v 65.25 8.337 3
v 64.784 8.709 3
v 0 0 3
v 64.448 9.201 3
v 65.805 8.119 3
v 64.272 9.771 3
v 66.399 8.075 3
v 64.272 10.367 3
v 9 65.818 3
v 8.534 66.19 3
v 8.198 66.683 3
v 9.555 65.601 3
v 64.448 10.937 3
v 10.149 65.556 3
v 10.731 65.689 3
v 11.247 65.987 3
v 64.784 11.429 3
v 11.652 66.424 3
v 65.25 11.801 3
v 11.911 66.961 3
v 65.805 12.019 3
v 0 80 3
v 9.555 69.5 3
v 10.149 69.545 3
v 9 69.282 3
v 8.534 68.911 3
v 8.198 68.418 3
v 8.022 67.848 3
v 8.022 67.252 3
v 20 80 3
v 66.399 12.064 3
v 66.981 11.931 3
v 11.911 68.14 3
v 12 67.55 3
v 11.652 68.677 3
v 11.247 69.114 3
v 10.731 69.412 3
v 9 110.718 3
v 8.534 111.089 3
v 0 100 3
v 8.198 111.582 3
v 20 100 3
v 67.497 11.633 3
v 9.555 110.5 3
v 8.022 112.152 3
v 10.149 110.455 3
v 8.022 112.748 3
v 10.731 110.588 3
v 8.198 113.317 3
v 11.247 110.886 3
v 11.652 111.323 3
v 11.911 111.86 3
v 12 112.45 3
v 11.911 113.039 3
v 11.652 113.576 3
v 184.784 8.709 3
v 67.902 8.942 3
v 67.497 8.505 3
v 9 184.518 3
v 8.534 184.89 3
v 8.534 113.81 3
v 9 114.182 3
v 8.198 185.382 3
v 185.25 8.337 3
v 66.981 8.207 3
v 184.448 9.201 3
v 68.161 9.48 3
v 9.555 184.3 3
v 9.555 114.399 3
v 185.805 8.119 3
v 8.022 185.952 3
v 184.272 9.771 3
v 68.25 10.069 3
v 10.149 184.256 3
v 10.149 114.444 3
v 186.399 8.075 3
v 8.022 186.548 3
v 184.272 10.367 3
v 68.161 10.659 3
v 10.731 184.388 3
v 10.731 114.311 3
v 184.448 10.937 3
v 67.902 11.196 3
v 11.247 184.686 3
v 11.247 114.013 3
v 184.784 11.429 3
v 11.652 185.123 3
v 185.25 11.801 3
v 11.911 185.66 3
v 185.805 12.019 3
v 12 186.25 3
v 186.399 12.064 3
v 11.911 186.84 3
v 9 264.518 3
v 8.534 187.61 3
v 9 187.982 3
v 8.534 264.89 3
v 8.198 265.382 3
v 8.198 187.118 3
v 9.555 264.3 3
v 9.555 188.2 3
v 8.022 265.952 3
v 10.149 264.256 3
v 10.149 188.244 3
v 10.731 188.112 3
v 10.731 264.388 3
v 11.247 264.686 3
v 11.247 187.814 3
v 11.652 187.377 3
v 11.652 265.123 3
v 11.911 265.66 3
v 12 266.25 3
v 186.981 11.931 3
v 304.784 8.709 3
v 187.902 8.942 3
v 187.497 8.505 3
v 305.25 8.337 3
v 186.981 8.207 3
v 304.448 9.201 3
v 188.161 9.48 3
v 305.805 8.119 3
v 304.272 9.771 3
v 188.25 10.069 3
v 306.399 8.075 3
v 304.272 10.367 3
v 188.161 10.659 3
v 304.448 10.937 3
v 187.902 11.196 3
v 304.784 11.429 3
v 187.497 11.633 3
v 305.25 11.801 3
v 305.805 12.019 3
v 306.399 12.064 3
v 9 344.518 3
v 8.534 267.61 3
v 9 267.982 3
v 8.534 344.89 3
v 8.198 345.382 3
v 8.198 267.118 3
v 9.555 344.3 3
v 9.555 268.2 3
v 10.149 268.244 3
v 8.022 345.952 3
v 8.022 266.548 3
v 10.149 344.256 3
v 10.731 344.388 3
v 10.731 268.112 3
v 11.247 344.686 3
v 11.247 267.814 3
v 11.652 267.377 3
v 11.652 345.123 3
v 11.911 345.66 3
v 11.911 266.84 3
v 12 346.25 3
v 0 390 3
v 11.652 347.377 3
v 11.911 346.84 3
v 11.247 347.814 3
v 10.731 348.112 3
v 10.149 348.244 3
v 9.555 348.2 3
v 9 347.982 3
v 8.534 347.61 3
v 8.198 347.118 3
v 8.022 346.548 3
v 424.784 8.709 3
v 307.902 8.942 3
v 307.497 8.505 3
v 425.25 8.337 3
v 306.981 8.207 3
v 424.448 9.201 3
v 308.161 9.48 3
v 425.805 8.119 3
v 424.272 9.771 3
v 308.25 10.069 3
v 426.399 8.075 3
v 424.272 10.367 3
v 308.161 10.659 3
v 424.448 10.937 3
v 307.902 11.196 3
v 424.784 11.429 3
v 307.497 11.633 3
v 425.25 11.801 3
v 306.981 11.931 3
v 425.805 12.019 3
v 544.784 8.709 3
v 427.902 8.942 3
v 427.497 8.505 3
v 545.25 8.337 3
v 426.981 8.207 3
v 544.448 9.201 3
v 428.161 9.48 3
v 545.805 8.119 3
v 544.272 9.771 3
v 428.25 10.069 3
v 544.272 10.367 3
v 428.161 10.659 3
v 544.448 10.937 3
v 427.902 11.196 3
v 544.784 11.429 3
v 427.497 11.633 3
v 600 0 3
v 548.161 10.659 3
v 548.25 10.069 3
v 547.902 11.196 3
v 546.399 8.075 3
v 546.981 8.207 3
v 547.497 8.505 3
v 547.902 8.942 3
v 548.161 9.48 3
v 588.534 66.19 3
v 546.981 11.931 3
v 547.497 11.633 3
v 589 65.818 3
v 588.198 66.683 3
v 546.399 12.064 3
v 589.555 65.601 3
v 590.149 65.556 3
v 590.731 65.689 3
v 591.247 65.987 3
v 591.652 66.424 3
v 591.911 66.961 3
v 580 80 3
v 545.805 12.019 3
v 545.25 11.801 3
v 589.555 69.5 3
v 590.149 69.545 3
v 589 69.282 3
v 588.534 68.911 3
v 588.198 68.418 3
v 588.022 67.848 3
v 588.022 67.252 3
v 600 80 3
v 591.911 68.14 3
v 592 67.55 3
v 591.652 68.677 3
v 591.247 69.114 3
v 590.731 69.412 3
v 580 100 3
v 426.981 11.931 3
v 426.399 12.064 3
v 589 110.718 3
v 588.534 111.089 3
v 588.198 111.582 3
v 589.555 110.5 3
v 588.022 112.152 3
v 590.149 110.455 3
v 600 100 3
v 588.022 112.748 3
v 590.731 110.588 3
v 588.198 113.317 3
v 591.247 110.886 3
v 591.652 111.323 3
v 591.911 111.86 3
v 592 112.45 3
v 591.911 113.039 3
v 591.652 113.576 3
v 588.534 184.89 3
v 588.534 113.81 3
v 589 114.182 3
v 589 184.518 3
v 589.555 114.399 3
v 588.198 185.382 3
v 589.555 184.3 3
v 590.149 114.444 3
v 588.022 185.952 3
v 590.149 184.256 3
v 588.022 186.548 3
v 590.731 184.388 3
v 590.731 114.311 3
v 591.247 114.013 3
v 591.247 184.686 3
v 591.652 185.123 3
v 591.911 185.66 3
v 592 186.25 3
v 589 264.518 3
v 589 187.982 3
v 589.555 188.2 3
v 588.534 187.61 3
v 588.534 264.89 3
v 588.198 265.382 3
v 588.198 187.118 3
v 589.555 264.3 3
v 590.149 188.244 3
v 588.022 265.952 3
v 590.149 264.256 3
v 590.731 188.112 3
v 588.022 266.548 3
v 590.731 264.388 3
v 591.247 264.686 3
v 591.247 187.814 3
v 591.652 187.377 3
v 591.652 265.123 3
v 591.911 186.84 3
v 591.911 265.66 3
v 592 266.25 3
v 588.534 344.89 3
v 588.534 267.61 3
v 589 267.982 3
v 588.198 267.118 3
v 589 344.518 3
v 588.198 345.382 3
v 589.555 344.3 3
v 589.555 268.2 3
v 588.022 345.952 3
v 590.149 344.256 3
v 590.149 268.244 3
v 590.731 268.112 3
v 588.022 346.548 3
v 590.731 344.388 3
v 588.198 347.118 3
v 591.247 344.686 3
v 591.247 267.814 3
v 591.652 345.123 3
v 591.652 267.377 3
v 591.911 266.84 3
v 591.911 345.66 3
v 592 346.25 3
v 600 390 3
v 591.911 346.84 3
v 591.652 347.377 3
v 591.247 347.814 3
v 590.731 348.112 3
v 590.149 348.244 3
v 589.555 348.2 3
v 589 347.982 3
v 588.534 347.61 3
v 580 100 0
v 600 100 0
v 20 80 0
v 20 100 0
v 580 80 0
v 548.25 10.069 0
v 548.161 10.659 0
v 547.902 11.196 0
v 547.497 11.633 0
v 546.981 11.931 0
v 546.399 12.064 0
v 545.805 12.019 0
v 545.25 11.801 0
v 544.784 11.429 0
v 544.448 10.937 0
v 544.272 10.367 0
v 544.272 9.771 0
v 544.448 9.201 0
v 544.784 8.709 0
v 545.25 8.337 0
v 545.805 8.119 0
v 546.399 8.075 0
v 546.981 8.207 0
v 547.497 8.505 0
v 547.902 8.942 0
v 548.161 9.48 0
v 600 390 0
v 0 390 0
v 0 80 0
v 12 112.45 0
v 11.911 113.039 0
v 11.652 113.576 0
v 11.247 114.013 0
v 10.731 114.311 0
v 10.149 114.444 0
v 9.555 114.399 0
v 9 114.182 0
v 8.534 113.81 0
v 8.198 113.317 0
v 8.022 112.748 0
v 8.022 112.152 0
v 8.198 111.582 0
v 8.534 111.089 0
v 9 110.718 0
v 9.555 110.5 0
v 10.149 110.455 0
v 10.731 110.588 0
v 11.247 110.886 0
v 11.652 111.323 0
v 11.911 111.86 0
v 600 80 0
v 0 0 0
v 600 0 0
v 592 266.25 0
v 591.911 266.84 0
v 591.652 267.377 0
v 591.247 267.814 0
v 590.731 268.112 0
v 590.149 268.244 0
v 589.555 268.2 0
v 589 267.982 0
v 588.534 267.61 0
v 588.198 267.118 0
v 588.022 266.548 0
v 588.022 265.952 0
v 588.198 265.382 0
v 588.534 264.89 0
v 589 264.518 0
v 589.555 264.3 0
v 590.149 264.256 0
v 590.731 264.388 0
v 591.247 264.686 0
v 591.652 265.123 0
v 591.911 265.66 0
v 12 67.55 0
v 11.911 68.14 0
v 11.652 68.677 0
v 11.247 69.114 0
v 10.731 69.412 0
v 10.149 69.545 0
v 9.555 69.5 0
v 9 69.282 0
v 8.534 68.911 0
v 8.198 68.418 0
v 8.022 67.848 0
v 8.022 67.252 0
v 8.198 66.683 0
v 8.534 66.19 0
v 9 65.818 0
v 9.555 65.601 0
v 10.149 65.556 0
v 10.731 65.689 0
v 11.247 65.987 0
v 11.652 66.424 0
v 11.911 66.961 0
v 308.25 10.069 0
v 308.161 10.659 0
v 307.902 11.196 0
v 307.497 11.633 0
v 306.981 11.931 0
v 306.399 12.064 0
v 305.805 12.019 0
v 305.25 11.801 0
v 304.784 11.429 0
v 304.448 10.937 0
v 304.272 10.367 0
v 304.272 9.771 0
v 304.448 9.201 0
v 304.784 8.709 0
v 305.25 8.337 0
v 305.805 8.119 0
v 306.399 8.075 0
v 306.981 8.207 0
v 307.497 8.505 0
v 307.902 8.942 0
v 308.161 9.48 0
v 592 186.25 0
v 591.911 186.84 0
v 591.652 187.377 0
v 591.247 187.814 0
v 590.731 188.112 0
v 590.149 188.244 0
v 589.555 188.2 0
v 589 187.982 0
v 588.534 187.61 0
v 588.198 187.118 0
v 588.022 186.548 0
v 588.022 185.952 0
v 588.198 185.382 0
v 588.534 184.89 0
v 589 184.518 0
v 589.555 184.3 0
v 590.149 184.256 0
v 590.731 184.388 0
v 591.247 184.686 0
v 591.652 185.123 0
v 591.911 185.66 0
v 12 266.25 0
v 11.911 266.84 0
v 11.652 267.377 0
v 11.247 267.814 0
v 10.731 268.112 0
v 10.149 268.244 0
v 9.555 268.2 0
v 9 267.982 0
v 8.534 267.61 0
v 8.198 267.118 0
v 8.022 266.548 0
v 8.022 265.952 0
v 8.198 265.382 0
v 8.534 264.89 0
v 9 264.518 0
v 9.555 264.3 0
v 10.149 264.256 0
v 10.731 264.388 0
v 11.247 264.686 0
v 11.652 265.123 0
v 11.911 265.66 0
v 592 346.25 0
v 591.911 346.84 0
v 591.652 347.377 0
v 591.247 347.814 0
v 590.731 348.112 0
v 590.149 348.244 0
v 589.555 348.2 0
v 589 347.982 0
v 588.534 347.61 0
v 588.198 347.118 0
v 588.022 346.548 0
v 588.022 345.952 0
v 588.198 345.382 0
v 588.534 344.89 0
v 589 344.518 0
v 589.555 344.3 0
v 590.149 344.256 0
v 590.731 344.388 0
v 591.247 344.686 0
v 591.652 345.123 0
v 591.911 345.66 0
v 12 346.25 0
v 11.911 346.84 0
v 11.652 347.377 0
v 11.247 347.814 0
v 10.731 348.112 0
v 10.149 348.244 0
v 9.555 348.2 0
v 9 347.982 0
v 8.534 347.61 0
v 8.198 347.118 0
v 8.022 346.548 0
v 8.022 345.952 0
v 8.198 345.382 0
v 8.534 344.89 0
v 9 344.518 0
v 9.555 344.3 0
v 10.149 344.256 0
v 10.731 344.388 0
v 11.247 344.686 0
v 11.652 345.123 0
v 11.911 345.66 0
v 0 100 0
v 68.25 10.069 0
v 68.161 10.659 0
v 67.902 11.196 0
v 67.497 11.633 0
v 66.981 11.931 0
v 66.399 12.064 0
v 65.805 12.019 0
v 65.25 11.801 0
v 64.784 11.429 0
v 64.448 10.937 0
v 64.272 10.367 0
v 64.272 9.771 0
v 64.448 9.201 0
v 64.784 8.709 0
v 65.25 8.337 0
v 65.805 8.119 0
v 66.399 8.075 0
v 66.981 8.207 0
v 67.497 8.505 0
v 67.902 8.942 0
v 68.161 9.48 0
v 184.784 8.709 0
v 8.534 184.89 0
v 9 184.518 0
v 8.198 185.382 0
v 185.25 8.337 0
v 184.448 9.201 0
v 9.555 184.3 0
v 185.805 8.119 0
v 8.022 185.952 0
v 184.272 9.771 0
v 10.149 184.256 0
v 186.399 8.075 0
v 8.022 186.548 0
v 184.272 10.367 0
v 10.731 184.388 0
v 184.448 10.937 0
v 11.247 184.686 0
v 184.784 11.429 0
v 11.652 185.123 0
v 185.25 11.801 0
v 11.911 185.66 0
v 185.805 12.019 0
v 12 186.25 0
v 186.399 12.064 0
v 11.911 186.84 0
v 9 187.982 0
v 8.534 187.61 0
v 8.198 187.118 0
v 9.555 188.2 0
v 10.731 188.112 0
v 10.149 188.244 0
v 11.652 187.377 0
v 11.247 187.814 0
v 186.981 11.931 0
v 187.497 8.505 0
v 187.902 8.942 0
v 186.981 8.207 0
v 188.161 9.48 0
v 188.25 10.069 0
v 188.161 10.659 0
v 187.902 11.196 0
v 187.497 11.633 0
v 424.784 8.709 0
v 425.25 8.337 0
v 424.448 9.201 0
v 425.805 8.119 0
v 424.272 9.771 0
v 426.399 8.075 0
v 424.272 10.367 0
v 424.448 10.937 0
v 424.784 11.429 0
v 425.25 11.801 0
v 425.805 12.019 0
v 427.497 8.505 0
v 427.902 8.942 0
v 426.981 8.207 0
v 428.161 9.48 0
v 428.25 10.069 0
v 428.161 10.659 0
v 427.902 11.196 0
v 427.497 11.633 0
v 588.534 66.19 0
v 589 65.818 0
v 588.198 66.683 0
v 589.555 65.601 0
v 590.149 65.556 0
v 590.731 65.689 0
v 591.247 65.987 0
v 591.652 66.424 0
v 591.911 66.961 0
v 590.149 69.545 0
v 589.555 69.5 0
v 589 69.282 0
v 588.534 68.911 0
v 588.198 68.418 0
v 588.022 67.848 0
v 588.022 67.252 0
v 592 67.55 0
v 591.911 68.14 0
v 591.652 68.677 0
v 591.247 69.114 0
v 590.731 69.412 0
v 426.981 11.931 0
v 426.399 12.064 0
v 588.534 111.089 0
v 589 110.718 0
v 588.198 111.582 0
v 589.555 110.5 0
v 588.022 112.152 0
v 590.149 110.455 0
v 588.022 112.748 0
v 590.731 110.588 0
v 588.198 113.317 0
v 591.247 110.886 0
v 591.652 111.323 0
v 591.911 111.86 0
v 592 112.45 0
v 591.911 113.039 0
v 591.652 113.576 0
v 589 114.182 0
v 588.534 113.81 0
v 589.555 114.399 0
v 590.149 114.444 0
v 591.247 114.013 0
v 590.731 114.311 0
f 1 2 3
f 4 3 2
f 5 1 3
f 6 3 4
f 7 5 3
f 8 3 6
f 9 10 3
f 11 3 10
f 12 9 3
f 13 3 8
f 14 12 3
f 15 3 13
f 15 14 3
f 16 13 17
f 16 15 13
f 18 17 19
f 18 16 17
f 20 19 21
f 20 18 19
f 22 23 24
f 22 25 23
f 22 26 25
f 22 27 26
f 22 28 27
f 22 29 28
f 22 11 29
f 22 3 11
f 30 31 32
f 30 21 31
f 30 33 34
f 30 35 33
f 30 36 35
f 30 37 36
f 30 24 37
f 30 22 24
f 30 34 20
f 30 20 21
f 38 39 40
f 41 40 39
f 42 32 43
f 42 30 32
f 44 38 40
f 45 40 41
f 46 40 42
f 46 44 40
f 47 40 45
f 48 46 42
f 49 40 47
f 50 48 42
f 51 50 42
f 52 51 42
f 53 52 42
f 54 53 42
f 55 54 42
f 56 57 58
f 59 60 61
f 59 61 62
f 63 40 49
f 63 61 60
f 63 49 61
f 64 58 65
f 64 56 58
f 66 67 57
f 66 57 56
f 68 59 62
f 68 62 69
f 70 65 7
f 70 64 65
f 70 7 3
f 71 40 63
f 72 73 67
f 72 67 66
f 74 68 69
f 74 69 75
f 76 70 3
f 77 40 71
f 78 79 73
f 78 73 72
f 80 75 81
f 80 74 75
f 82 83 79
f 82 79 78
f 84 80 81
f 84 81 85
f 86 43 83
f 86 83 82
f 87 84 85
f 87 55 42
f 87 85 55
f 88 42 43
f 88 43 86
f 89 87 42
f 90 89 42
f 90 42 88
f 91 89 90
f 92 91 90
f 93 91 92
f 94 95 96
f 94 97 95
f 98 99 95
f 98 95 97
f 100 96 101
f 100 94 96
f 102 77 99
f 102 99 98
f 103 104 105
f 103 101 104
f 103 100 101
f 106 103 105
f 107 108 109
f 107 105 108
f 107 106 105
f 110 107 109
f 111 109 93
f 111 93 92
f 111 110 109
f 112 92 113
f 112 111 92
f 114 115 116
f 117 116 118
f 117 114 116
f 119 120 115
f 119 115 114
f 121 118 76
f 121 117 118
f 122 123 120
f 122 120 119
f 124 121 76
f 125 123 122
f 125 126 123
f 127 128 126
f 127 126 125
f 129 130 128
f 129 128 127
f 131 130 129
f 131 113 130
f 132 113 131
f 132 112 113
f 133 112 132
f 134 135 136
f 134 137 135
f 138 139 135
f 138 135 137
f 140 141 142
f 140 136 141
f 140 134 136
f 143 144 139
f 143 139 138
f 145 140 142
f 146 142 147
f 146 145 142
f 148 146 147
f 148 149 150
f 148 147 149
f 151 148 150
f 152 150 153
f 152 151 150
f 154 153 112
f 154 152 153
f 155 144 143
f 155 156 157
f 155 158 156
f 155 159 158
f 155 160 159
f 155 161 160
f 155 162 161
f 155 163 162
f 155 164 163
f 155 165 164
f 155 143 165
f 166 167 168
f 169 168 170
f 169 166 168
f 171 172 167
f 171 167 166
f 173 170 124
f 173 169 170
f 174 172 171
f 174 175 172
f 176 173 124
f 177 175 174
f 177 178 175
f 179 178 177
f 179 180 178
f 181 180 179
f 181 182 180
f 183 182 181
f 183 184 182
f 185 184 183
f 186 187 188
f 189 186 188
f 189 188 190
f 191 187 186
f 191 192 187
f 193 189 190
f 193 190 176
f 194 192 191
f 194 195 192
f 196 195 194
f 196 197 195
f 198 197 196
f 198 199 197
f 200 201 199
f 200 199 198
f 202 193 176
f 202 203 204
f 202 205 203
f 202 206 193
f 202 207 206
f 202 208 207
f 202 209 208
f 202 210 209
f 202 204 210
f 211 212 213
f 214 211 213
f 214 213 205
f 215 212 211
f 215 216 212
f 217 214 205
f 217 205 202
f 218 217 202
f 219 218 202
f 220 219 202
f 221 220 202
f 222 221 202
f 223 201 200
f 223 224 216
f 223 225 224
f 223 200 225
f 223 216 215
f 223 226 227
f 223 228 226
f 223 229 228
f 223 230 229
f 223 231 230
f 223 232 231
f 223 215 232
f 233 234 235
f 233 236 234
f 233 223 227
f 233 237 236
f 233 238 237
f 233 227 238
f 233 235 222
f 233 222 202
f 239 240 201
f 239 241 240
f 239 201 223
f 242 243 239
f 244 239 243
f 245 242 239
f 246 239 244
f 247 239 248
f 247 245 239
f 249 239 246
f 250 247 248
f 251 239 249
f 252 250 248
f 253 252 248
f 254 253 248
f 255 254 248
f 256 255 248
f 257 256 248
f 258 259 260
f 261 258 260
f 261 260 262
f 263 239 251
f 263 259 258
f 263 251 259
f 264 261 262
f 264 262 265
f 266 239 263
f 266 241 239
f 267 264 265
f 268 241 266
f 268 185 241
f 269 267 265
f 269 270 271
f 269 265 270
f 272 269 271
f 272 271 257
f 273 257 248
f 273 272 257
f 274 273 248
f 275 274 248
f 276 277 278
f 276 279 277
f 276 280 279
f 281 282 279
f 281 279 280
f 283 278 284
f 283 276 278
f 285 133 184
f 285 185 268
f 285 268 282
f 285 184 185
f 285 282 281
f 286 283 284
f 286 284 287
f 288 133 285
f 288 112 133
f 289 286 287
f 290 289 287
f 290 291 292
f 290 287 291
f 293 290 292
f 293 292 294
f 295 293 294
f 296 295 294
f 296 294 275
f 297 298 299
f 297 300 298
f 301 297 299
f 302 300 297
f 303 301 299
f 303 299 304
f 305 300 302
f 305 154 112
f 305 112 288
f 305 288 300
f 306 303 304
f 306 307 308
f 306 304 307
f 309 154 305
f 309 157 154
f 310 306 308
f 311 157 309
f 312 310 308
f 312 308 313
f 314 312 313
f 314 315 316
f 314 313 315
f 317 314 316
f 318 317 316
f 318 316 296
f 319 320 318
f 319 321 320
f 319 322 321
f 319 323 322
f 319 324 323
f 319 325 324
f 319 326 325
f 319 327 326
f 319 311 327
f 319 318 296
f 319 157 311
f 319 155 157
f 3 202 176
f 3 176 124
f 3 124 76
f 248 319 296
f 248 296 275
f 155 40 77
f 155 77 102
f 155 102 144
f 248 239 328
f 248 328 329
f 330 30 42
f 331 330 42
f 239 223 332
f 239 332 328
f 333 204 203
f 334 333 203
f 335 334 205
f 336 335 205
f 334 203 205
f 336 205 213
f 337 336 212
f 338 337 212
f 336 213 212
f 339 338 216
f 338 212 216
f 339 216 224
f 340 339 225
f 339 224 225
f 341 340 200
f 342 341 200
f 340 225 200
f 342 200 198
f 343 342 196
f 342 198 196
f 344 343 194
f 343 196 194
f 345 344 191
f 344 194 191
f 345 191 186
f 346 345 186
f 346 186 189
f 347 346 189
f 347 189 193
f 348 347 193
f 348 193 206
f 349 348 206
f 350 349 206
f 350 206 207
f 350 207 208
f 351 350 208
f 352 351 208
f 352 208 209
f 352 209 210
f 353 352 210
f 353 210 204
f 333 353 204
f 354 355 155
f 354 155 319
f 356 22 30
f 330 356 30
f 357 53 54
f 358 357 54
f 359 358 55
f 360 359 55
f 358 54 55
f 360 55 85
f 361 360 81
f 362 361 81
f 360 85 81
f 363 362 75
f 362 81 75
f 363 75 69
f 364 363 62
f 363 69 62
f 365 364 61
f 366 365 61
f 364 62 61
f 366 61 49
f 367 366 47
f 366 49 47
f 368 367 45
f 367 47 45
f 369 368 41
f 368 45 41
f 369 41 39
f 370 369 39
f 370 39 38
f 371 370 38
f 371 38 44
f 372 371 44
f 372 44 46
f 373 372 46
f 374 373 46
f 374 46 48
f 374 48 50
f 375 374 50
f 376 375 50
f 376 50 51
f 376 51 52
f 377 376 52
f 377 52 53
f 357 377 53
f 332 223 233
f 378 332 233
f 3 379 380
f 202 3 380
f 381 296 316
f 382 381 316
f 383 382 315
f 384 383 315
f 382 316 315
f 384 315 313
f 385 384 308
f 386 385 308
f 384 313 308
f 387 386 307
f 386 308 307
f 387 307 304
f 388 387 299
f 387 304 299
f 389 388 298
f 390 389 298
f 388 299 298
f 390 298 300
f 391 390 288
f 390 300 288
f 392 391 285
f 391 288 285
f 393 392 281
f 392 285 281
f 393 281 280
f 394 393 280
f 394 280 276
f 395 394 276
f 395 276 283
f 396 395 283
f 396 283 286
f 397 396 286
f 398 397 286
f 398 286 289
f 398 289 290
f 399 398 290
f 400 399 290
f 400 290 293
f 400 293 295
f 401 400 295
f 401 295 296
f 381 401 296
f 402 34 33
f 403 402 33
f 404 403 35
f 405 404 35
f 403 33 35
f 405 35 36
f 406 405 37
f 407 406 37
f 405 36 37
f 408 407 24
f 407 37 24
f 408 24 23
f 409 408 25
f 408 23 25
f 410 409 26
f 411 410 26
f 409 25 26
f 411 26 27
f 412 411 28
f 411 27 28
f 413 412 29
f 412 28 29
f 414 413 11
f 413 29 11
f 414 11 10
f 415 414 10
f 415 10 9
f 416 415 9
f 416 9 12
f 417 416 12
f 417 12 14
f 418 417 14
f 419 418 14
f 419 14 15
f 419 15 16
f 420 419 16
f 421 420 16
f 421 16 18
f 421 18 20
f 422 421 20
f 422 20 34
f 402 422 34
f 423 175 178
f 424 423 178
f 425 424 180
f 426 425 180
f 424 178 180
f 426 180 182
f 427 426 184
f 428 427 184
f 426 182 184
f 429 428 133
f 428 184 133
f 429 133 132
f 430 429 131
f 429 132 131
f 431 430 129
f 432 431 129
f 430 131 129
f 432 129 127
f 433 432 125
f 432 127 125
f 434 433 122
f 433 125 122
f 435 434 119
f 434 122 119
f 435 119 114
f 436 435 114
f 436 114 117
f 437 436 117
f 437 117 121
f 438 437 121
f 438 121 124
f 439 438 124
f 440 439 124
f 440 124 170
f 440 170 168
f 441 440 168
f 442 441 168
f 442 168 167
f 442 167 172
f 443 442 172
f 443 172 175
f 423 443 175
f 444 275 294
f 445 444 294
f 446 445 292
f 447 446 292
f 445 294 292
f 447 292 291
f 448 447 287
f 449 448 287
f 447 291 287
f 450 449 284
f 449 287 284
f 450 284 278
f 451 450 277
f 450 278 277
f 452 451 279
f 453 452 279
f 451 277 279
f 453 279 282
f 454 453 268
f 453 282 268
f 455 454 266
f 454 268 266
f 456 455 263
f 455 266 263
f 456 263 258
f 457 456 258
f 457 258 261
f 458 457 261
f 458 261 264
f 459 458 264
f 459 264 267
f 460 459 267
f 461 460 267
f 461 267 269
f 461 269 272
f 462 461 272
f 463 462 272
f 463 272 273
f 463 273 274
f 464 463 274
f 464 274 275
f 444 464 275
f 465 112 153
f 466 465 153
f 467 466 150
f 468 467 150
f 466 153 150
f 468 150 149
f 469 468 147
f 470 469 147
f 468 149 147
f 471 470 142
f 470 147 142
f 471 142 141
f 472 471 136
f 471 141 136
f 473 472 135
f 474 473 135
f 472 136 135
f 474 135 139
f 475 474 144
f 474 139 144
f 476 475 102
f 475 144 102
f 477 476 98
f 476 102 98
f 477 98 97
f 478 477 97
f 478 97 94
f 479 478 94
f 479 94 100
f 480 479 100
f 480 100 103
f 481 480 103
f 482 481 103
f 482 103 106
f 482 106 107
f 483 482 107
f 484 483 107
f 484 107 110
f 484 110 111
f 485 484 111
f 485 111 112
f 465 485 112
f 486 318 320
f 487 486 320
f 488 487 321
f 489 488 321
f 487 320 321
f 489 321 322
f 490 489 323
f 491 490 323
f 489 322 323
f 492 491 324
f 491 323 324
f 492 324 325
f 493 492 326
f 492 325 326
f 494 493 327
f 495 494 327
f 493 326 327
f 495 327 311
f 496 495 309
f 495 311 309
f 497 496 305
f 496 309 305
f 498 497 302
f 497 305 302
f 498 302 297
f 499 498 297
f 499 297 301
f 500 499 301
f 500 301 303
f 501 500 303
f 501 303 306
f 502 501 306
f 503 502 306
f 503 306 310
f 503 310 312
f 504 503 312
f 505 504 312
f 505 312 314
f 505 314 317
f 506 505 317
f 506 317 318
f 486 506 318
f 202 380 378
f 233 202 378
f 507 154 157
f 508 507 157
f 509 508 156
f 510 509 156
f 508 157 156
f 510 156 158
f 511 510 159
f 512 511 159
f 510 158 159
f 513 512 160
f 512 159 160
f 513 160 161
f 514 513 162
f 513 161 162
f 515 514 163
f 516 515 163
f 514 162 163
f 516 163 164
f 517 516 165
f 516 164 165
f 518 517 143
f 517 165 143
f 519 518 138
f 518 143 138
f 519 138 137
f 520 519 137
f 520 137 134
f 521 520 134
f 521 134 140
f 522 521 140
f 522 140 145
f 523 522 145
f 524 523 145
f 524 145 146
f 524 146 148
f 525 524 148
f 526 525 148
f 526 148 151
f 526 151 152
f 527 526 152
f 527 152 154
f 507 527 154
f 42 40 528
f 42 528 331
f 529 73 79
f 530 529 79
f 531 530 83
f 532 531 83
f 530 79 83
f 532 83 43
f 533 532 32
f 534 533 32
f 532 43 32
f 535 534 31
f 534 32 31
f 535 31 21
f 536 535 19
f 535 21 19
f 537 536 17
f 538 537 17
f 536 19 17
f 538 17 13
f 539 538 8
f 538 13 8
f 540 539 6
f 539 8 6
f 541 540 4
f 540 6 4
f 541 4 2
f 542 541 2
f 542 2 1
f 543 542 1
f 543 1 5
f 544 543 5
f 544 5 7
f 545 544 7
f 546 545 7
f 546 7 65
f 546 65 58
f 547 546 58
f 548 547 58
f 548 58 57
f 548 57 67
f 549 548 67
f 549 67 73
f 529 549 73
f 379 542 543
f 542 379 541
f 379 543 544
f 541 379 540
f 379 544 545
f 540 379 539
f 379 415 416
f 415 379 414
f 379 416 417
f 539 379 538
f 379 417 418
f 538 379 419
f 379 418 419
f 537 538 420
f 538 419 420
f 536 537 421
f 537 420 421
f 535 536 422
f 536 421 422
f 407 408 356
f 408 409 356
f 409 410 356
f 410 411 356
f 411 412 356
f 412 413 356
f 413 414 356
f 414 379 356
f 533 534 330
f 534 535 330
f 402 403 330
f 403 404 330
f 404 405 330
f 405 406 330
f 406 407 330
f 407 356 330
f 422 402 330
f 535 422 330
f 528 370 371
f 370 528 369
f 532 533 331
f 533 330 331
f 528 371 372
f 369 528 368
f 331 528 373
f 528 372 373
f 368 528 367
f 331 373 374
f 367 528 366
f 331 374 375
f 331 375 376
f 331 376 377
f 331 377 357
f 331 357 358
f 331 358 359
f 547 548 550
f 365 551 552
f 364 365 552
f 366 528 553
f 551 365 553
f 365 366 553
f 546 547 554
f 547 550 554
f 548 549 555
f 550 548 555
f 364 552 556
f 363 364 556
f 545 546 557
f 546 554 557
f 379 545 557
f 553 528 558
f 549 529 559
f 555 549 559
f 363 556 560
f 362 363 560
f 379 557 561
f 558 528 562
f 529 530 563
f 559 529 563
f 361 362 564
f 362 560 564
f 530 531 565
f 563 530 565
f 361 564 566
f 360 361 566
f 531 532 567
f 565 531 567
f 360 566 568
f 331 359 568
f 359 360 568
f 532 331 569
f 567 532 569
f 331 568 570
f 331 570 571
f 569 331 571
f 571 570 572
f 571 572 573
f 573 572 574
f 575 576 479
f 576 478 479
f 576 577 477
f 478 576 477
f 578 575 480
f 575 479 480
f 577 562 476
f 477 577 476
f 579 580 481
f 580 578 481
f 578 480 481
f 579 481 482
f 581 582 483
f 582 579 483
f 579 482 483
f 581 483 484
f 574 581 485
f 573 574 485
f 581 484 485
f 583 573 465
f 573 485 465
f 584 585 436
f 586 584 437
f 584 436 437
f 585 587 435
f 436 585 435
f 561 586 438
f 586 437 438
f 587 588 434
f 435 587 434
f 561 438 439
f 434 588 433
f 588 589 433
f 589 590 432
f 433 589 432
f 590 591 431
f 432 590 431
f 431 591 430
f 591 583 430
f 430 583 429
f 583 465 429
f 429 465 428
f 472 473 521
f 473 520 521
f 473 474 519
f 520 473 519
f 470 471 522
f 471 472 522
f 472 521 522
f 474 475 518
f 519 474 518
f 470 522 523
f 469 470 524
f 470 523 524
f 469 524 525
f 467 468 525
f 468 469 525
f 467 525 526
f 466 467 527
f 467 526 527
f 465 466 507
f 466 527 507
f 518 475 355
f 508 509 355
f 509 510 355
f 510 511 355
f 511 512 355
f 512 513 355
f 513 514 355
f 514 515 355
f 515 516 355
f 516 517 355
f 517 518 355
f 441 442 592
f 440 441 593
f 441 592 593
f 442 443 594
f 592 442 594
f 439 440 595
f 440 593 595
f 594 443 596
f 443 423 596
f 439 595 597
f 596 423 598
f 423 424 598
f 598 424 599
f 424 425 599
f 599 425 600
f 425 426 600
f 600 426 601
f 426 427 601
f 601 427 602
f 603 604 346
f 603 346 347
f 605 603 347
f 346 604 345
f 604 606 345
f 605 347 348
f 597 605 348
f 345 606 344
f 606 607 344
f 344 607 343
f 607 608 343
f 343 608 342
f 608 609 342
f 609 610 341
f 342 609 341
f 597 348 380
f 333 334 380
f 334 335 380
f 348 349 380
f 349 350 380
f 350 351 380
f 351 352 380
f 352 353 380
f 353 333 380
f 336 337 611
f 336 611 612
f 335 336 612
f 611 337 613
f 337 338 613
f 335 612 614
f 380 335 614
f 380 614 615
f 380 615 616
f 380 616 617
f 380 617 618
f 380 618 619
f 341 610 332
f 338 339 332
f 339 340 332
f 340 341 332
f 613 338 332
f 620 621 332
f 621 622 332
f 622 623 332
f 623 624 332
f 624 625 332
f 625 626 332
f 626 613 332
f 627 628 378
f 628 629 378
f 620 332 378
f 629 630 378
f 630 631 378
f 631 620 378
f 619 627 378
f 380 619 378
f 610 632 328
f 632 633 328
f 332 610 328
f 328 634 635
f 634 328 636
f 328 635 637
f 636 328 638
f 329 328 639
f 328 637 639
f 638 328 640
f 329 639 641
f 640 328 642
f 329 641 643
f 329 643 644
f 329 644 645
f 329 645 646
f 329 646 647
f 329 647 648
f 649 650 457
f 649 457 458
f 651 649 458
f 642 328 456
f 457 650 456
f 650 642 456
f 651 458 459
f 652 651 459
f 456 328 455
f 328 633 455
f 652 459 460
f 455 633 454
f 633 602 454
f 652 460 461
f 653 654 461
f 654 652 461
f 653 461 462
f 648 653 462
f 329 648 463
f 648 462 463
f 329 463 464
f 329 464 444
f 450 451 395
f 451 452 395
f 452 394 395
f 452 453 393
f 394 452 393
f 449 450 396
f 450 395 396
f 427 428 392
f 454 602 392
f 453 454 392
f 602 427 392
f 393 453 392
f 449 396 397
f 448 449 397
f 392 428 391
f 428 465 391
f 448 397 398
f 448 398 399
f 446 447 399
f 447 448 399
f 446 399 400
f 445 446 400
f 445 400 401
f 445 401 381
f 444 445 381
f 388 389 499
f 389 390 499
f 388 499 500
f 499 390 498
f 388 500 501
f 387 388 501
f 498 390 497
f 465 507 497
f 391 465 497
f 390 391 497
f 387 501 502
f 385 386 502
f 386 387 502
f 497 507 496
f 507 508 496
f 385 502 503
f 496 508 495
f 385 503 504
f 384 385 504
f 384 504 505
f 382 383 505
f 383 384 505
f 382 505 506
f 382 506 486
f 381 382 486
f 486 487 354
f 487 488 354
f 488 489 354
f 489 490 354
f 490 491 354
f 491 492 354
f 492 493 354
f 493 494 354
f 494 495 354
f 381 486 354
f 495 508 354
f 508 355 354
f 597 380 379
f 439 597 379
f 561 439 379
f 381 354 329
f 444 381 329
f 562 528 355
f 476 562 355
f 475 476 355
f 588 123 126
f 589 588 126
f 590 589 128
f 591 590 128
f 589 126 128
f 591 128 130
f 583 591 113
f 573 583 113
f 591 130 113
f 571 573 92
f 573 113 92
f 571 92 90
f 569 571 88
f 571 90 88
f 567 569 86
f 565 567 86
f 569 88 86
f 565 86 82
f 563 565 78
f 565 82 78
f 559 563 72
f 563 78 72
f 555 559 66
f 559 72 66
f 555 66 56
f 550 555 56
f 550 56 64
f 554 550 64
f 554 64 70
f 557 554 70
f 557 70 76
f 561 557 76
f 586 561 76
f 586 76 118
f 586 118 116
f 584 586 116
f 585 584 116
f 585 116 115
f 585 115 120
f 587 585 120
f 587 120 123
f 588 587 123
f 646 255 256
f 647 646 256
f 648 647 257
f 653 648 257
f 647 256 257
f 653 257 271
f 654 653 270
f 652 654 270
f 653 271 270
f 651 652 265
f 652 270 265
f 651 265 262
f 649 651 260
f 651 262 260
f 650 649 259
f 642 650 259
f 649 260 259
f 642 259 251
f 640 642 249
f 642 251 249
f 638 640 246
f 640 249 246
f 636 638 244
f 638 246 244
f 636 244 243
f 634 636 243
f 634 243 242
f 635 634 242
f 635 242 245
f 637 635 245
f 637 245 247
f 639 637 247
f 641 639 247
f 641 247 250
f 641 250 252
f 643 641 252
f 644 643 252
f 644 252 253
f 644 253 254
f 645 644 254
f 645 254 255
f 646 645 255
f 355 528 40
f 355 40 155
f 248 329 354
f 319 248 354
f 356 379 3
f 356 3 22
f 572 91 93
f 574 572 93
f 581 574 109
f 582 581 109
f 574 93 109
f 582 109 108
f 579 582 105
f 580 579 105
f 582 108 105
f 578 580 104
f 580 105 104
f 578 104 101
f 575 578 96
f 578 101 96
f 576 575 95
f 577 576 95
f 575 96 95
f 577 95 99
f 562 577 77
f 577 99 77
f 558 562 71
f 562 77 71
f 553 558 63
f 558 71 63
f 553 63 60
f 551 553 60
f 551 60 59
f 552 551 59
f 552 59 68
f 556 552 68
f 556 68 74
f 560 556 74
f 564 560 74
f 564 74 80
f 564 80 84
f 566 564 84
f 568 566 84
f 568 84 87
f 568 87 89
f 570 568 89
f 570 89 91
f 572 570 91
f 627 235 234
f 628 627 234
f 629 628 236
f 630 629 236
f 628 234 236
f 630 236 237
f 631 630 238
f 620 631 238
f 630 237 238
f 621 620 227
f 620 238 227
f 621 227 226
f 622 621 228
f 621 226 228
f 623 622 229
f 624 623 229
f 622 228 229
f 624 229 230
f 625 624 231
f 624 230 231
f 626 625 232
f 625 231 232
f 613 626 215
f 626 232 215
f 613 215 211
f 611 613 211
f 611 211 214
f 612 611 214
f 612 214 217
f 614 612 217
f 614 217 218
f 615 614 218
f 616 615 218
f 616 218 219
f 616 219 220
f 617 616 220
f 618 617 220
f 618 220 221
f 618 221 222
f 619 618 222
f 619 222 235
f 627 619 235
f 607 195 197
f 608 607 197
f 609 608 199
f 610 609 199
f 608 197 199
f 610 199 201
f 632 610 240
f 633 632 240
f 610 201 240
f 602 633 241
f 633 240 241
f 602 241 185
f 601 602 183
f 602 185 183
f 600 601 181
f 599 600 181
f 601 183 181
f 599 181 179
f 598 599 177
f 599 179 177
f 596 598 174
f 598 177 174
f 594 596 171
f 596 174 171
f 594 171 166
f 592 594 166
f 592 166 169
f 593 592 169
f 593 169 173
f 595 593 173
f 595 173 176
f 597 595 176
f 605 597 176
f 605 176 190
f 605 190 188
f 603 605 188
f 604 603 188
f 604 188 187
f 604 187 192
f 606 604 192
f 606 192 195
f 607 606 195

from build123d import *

# Parameters (mm, degrees)
SKETCH1_W             = 600
SKETCH1_H             = 390
BOSS_EXTRUDE1_DEPTH   = 3
SKETCH2_W             = 20
SKETCH2_H             = 20
CUT_EXTRUDE1_DEPTH    = 3
F_4_0MM_DOWEL_HOLE1_D = 4


with BuildPart() as part:
    # Sketch1 → Boss-Extrude1 (new body)
    with BuildSketch(Plane.XY):
        with Locations((300, 195)):
            Rectangle(SKETCH1_W, SKETCH1_H)
    extrude(amount=BOSS_EXTRUDE1_DEPTH)

    # Sketch2 → Cut-Extrude1 (cut)
    with BuildSketch(Plane.XY.offset(3)):
        with Locations((590, 90)):
            Rectangle(SKETCH2_W, SKETCH2_H)
        with Locations((10, 90)):
            Rectangle(SKETCH2_W, SKETCH2_H)
    extrude(amount=-CUT_EXTRUDE1_DEPTH, mode=Mode.SUBTRACT)

    # Ø4.0mm Dowel Hole1 (through all)
    with Locations(Plane(origin=(0, 0, 0), x_dir=(-1, 0, 0), z_dir=(0, 0, -1))):
        with Locations((-590, 346.25), (-10, 346.25), (-10, 266.25), (-10, 186.25), (-590, 266.25), (-590, 186.25), (-590, 112.449594156), (-590, 67.550405844), (-10, 112.449594156), (-10, 67.550405844), (-66.25, 10.069105371), (-186.25, 10.069105371), (-306.25, 10.069105371), (-426.25, 10.069105371), (-546.25, 10.069105371)):
            Hole(F_4_0MM_DOWEL_HOLE1_D / 2)


solid = part.part
